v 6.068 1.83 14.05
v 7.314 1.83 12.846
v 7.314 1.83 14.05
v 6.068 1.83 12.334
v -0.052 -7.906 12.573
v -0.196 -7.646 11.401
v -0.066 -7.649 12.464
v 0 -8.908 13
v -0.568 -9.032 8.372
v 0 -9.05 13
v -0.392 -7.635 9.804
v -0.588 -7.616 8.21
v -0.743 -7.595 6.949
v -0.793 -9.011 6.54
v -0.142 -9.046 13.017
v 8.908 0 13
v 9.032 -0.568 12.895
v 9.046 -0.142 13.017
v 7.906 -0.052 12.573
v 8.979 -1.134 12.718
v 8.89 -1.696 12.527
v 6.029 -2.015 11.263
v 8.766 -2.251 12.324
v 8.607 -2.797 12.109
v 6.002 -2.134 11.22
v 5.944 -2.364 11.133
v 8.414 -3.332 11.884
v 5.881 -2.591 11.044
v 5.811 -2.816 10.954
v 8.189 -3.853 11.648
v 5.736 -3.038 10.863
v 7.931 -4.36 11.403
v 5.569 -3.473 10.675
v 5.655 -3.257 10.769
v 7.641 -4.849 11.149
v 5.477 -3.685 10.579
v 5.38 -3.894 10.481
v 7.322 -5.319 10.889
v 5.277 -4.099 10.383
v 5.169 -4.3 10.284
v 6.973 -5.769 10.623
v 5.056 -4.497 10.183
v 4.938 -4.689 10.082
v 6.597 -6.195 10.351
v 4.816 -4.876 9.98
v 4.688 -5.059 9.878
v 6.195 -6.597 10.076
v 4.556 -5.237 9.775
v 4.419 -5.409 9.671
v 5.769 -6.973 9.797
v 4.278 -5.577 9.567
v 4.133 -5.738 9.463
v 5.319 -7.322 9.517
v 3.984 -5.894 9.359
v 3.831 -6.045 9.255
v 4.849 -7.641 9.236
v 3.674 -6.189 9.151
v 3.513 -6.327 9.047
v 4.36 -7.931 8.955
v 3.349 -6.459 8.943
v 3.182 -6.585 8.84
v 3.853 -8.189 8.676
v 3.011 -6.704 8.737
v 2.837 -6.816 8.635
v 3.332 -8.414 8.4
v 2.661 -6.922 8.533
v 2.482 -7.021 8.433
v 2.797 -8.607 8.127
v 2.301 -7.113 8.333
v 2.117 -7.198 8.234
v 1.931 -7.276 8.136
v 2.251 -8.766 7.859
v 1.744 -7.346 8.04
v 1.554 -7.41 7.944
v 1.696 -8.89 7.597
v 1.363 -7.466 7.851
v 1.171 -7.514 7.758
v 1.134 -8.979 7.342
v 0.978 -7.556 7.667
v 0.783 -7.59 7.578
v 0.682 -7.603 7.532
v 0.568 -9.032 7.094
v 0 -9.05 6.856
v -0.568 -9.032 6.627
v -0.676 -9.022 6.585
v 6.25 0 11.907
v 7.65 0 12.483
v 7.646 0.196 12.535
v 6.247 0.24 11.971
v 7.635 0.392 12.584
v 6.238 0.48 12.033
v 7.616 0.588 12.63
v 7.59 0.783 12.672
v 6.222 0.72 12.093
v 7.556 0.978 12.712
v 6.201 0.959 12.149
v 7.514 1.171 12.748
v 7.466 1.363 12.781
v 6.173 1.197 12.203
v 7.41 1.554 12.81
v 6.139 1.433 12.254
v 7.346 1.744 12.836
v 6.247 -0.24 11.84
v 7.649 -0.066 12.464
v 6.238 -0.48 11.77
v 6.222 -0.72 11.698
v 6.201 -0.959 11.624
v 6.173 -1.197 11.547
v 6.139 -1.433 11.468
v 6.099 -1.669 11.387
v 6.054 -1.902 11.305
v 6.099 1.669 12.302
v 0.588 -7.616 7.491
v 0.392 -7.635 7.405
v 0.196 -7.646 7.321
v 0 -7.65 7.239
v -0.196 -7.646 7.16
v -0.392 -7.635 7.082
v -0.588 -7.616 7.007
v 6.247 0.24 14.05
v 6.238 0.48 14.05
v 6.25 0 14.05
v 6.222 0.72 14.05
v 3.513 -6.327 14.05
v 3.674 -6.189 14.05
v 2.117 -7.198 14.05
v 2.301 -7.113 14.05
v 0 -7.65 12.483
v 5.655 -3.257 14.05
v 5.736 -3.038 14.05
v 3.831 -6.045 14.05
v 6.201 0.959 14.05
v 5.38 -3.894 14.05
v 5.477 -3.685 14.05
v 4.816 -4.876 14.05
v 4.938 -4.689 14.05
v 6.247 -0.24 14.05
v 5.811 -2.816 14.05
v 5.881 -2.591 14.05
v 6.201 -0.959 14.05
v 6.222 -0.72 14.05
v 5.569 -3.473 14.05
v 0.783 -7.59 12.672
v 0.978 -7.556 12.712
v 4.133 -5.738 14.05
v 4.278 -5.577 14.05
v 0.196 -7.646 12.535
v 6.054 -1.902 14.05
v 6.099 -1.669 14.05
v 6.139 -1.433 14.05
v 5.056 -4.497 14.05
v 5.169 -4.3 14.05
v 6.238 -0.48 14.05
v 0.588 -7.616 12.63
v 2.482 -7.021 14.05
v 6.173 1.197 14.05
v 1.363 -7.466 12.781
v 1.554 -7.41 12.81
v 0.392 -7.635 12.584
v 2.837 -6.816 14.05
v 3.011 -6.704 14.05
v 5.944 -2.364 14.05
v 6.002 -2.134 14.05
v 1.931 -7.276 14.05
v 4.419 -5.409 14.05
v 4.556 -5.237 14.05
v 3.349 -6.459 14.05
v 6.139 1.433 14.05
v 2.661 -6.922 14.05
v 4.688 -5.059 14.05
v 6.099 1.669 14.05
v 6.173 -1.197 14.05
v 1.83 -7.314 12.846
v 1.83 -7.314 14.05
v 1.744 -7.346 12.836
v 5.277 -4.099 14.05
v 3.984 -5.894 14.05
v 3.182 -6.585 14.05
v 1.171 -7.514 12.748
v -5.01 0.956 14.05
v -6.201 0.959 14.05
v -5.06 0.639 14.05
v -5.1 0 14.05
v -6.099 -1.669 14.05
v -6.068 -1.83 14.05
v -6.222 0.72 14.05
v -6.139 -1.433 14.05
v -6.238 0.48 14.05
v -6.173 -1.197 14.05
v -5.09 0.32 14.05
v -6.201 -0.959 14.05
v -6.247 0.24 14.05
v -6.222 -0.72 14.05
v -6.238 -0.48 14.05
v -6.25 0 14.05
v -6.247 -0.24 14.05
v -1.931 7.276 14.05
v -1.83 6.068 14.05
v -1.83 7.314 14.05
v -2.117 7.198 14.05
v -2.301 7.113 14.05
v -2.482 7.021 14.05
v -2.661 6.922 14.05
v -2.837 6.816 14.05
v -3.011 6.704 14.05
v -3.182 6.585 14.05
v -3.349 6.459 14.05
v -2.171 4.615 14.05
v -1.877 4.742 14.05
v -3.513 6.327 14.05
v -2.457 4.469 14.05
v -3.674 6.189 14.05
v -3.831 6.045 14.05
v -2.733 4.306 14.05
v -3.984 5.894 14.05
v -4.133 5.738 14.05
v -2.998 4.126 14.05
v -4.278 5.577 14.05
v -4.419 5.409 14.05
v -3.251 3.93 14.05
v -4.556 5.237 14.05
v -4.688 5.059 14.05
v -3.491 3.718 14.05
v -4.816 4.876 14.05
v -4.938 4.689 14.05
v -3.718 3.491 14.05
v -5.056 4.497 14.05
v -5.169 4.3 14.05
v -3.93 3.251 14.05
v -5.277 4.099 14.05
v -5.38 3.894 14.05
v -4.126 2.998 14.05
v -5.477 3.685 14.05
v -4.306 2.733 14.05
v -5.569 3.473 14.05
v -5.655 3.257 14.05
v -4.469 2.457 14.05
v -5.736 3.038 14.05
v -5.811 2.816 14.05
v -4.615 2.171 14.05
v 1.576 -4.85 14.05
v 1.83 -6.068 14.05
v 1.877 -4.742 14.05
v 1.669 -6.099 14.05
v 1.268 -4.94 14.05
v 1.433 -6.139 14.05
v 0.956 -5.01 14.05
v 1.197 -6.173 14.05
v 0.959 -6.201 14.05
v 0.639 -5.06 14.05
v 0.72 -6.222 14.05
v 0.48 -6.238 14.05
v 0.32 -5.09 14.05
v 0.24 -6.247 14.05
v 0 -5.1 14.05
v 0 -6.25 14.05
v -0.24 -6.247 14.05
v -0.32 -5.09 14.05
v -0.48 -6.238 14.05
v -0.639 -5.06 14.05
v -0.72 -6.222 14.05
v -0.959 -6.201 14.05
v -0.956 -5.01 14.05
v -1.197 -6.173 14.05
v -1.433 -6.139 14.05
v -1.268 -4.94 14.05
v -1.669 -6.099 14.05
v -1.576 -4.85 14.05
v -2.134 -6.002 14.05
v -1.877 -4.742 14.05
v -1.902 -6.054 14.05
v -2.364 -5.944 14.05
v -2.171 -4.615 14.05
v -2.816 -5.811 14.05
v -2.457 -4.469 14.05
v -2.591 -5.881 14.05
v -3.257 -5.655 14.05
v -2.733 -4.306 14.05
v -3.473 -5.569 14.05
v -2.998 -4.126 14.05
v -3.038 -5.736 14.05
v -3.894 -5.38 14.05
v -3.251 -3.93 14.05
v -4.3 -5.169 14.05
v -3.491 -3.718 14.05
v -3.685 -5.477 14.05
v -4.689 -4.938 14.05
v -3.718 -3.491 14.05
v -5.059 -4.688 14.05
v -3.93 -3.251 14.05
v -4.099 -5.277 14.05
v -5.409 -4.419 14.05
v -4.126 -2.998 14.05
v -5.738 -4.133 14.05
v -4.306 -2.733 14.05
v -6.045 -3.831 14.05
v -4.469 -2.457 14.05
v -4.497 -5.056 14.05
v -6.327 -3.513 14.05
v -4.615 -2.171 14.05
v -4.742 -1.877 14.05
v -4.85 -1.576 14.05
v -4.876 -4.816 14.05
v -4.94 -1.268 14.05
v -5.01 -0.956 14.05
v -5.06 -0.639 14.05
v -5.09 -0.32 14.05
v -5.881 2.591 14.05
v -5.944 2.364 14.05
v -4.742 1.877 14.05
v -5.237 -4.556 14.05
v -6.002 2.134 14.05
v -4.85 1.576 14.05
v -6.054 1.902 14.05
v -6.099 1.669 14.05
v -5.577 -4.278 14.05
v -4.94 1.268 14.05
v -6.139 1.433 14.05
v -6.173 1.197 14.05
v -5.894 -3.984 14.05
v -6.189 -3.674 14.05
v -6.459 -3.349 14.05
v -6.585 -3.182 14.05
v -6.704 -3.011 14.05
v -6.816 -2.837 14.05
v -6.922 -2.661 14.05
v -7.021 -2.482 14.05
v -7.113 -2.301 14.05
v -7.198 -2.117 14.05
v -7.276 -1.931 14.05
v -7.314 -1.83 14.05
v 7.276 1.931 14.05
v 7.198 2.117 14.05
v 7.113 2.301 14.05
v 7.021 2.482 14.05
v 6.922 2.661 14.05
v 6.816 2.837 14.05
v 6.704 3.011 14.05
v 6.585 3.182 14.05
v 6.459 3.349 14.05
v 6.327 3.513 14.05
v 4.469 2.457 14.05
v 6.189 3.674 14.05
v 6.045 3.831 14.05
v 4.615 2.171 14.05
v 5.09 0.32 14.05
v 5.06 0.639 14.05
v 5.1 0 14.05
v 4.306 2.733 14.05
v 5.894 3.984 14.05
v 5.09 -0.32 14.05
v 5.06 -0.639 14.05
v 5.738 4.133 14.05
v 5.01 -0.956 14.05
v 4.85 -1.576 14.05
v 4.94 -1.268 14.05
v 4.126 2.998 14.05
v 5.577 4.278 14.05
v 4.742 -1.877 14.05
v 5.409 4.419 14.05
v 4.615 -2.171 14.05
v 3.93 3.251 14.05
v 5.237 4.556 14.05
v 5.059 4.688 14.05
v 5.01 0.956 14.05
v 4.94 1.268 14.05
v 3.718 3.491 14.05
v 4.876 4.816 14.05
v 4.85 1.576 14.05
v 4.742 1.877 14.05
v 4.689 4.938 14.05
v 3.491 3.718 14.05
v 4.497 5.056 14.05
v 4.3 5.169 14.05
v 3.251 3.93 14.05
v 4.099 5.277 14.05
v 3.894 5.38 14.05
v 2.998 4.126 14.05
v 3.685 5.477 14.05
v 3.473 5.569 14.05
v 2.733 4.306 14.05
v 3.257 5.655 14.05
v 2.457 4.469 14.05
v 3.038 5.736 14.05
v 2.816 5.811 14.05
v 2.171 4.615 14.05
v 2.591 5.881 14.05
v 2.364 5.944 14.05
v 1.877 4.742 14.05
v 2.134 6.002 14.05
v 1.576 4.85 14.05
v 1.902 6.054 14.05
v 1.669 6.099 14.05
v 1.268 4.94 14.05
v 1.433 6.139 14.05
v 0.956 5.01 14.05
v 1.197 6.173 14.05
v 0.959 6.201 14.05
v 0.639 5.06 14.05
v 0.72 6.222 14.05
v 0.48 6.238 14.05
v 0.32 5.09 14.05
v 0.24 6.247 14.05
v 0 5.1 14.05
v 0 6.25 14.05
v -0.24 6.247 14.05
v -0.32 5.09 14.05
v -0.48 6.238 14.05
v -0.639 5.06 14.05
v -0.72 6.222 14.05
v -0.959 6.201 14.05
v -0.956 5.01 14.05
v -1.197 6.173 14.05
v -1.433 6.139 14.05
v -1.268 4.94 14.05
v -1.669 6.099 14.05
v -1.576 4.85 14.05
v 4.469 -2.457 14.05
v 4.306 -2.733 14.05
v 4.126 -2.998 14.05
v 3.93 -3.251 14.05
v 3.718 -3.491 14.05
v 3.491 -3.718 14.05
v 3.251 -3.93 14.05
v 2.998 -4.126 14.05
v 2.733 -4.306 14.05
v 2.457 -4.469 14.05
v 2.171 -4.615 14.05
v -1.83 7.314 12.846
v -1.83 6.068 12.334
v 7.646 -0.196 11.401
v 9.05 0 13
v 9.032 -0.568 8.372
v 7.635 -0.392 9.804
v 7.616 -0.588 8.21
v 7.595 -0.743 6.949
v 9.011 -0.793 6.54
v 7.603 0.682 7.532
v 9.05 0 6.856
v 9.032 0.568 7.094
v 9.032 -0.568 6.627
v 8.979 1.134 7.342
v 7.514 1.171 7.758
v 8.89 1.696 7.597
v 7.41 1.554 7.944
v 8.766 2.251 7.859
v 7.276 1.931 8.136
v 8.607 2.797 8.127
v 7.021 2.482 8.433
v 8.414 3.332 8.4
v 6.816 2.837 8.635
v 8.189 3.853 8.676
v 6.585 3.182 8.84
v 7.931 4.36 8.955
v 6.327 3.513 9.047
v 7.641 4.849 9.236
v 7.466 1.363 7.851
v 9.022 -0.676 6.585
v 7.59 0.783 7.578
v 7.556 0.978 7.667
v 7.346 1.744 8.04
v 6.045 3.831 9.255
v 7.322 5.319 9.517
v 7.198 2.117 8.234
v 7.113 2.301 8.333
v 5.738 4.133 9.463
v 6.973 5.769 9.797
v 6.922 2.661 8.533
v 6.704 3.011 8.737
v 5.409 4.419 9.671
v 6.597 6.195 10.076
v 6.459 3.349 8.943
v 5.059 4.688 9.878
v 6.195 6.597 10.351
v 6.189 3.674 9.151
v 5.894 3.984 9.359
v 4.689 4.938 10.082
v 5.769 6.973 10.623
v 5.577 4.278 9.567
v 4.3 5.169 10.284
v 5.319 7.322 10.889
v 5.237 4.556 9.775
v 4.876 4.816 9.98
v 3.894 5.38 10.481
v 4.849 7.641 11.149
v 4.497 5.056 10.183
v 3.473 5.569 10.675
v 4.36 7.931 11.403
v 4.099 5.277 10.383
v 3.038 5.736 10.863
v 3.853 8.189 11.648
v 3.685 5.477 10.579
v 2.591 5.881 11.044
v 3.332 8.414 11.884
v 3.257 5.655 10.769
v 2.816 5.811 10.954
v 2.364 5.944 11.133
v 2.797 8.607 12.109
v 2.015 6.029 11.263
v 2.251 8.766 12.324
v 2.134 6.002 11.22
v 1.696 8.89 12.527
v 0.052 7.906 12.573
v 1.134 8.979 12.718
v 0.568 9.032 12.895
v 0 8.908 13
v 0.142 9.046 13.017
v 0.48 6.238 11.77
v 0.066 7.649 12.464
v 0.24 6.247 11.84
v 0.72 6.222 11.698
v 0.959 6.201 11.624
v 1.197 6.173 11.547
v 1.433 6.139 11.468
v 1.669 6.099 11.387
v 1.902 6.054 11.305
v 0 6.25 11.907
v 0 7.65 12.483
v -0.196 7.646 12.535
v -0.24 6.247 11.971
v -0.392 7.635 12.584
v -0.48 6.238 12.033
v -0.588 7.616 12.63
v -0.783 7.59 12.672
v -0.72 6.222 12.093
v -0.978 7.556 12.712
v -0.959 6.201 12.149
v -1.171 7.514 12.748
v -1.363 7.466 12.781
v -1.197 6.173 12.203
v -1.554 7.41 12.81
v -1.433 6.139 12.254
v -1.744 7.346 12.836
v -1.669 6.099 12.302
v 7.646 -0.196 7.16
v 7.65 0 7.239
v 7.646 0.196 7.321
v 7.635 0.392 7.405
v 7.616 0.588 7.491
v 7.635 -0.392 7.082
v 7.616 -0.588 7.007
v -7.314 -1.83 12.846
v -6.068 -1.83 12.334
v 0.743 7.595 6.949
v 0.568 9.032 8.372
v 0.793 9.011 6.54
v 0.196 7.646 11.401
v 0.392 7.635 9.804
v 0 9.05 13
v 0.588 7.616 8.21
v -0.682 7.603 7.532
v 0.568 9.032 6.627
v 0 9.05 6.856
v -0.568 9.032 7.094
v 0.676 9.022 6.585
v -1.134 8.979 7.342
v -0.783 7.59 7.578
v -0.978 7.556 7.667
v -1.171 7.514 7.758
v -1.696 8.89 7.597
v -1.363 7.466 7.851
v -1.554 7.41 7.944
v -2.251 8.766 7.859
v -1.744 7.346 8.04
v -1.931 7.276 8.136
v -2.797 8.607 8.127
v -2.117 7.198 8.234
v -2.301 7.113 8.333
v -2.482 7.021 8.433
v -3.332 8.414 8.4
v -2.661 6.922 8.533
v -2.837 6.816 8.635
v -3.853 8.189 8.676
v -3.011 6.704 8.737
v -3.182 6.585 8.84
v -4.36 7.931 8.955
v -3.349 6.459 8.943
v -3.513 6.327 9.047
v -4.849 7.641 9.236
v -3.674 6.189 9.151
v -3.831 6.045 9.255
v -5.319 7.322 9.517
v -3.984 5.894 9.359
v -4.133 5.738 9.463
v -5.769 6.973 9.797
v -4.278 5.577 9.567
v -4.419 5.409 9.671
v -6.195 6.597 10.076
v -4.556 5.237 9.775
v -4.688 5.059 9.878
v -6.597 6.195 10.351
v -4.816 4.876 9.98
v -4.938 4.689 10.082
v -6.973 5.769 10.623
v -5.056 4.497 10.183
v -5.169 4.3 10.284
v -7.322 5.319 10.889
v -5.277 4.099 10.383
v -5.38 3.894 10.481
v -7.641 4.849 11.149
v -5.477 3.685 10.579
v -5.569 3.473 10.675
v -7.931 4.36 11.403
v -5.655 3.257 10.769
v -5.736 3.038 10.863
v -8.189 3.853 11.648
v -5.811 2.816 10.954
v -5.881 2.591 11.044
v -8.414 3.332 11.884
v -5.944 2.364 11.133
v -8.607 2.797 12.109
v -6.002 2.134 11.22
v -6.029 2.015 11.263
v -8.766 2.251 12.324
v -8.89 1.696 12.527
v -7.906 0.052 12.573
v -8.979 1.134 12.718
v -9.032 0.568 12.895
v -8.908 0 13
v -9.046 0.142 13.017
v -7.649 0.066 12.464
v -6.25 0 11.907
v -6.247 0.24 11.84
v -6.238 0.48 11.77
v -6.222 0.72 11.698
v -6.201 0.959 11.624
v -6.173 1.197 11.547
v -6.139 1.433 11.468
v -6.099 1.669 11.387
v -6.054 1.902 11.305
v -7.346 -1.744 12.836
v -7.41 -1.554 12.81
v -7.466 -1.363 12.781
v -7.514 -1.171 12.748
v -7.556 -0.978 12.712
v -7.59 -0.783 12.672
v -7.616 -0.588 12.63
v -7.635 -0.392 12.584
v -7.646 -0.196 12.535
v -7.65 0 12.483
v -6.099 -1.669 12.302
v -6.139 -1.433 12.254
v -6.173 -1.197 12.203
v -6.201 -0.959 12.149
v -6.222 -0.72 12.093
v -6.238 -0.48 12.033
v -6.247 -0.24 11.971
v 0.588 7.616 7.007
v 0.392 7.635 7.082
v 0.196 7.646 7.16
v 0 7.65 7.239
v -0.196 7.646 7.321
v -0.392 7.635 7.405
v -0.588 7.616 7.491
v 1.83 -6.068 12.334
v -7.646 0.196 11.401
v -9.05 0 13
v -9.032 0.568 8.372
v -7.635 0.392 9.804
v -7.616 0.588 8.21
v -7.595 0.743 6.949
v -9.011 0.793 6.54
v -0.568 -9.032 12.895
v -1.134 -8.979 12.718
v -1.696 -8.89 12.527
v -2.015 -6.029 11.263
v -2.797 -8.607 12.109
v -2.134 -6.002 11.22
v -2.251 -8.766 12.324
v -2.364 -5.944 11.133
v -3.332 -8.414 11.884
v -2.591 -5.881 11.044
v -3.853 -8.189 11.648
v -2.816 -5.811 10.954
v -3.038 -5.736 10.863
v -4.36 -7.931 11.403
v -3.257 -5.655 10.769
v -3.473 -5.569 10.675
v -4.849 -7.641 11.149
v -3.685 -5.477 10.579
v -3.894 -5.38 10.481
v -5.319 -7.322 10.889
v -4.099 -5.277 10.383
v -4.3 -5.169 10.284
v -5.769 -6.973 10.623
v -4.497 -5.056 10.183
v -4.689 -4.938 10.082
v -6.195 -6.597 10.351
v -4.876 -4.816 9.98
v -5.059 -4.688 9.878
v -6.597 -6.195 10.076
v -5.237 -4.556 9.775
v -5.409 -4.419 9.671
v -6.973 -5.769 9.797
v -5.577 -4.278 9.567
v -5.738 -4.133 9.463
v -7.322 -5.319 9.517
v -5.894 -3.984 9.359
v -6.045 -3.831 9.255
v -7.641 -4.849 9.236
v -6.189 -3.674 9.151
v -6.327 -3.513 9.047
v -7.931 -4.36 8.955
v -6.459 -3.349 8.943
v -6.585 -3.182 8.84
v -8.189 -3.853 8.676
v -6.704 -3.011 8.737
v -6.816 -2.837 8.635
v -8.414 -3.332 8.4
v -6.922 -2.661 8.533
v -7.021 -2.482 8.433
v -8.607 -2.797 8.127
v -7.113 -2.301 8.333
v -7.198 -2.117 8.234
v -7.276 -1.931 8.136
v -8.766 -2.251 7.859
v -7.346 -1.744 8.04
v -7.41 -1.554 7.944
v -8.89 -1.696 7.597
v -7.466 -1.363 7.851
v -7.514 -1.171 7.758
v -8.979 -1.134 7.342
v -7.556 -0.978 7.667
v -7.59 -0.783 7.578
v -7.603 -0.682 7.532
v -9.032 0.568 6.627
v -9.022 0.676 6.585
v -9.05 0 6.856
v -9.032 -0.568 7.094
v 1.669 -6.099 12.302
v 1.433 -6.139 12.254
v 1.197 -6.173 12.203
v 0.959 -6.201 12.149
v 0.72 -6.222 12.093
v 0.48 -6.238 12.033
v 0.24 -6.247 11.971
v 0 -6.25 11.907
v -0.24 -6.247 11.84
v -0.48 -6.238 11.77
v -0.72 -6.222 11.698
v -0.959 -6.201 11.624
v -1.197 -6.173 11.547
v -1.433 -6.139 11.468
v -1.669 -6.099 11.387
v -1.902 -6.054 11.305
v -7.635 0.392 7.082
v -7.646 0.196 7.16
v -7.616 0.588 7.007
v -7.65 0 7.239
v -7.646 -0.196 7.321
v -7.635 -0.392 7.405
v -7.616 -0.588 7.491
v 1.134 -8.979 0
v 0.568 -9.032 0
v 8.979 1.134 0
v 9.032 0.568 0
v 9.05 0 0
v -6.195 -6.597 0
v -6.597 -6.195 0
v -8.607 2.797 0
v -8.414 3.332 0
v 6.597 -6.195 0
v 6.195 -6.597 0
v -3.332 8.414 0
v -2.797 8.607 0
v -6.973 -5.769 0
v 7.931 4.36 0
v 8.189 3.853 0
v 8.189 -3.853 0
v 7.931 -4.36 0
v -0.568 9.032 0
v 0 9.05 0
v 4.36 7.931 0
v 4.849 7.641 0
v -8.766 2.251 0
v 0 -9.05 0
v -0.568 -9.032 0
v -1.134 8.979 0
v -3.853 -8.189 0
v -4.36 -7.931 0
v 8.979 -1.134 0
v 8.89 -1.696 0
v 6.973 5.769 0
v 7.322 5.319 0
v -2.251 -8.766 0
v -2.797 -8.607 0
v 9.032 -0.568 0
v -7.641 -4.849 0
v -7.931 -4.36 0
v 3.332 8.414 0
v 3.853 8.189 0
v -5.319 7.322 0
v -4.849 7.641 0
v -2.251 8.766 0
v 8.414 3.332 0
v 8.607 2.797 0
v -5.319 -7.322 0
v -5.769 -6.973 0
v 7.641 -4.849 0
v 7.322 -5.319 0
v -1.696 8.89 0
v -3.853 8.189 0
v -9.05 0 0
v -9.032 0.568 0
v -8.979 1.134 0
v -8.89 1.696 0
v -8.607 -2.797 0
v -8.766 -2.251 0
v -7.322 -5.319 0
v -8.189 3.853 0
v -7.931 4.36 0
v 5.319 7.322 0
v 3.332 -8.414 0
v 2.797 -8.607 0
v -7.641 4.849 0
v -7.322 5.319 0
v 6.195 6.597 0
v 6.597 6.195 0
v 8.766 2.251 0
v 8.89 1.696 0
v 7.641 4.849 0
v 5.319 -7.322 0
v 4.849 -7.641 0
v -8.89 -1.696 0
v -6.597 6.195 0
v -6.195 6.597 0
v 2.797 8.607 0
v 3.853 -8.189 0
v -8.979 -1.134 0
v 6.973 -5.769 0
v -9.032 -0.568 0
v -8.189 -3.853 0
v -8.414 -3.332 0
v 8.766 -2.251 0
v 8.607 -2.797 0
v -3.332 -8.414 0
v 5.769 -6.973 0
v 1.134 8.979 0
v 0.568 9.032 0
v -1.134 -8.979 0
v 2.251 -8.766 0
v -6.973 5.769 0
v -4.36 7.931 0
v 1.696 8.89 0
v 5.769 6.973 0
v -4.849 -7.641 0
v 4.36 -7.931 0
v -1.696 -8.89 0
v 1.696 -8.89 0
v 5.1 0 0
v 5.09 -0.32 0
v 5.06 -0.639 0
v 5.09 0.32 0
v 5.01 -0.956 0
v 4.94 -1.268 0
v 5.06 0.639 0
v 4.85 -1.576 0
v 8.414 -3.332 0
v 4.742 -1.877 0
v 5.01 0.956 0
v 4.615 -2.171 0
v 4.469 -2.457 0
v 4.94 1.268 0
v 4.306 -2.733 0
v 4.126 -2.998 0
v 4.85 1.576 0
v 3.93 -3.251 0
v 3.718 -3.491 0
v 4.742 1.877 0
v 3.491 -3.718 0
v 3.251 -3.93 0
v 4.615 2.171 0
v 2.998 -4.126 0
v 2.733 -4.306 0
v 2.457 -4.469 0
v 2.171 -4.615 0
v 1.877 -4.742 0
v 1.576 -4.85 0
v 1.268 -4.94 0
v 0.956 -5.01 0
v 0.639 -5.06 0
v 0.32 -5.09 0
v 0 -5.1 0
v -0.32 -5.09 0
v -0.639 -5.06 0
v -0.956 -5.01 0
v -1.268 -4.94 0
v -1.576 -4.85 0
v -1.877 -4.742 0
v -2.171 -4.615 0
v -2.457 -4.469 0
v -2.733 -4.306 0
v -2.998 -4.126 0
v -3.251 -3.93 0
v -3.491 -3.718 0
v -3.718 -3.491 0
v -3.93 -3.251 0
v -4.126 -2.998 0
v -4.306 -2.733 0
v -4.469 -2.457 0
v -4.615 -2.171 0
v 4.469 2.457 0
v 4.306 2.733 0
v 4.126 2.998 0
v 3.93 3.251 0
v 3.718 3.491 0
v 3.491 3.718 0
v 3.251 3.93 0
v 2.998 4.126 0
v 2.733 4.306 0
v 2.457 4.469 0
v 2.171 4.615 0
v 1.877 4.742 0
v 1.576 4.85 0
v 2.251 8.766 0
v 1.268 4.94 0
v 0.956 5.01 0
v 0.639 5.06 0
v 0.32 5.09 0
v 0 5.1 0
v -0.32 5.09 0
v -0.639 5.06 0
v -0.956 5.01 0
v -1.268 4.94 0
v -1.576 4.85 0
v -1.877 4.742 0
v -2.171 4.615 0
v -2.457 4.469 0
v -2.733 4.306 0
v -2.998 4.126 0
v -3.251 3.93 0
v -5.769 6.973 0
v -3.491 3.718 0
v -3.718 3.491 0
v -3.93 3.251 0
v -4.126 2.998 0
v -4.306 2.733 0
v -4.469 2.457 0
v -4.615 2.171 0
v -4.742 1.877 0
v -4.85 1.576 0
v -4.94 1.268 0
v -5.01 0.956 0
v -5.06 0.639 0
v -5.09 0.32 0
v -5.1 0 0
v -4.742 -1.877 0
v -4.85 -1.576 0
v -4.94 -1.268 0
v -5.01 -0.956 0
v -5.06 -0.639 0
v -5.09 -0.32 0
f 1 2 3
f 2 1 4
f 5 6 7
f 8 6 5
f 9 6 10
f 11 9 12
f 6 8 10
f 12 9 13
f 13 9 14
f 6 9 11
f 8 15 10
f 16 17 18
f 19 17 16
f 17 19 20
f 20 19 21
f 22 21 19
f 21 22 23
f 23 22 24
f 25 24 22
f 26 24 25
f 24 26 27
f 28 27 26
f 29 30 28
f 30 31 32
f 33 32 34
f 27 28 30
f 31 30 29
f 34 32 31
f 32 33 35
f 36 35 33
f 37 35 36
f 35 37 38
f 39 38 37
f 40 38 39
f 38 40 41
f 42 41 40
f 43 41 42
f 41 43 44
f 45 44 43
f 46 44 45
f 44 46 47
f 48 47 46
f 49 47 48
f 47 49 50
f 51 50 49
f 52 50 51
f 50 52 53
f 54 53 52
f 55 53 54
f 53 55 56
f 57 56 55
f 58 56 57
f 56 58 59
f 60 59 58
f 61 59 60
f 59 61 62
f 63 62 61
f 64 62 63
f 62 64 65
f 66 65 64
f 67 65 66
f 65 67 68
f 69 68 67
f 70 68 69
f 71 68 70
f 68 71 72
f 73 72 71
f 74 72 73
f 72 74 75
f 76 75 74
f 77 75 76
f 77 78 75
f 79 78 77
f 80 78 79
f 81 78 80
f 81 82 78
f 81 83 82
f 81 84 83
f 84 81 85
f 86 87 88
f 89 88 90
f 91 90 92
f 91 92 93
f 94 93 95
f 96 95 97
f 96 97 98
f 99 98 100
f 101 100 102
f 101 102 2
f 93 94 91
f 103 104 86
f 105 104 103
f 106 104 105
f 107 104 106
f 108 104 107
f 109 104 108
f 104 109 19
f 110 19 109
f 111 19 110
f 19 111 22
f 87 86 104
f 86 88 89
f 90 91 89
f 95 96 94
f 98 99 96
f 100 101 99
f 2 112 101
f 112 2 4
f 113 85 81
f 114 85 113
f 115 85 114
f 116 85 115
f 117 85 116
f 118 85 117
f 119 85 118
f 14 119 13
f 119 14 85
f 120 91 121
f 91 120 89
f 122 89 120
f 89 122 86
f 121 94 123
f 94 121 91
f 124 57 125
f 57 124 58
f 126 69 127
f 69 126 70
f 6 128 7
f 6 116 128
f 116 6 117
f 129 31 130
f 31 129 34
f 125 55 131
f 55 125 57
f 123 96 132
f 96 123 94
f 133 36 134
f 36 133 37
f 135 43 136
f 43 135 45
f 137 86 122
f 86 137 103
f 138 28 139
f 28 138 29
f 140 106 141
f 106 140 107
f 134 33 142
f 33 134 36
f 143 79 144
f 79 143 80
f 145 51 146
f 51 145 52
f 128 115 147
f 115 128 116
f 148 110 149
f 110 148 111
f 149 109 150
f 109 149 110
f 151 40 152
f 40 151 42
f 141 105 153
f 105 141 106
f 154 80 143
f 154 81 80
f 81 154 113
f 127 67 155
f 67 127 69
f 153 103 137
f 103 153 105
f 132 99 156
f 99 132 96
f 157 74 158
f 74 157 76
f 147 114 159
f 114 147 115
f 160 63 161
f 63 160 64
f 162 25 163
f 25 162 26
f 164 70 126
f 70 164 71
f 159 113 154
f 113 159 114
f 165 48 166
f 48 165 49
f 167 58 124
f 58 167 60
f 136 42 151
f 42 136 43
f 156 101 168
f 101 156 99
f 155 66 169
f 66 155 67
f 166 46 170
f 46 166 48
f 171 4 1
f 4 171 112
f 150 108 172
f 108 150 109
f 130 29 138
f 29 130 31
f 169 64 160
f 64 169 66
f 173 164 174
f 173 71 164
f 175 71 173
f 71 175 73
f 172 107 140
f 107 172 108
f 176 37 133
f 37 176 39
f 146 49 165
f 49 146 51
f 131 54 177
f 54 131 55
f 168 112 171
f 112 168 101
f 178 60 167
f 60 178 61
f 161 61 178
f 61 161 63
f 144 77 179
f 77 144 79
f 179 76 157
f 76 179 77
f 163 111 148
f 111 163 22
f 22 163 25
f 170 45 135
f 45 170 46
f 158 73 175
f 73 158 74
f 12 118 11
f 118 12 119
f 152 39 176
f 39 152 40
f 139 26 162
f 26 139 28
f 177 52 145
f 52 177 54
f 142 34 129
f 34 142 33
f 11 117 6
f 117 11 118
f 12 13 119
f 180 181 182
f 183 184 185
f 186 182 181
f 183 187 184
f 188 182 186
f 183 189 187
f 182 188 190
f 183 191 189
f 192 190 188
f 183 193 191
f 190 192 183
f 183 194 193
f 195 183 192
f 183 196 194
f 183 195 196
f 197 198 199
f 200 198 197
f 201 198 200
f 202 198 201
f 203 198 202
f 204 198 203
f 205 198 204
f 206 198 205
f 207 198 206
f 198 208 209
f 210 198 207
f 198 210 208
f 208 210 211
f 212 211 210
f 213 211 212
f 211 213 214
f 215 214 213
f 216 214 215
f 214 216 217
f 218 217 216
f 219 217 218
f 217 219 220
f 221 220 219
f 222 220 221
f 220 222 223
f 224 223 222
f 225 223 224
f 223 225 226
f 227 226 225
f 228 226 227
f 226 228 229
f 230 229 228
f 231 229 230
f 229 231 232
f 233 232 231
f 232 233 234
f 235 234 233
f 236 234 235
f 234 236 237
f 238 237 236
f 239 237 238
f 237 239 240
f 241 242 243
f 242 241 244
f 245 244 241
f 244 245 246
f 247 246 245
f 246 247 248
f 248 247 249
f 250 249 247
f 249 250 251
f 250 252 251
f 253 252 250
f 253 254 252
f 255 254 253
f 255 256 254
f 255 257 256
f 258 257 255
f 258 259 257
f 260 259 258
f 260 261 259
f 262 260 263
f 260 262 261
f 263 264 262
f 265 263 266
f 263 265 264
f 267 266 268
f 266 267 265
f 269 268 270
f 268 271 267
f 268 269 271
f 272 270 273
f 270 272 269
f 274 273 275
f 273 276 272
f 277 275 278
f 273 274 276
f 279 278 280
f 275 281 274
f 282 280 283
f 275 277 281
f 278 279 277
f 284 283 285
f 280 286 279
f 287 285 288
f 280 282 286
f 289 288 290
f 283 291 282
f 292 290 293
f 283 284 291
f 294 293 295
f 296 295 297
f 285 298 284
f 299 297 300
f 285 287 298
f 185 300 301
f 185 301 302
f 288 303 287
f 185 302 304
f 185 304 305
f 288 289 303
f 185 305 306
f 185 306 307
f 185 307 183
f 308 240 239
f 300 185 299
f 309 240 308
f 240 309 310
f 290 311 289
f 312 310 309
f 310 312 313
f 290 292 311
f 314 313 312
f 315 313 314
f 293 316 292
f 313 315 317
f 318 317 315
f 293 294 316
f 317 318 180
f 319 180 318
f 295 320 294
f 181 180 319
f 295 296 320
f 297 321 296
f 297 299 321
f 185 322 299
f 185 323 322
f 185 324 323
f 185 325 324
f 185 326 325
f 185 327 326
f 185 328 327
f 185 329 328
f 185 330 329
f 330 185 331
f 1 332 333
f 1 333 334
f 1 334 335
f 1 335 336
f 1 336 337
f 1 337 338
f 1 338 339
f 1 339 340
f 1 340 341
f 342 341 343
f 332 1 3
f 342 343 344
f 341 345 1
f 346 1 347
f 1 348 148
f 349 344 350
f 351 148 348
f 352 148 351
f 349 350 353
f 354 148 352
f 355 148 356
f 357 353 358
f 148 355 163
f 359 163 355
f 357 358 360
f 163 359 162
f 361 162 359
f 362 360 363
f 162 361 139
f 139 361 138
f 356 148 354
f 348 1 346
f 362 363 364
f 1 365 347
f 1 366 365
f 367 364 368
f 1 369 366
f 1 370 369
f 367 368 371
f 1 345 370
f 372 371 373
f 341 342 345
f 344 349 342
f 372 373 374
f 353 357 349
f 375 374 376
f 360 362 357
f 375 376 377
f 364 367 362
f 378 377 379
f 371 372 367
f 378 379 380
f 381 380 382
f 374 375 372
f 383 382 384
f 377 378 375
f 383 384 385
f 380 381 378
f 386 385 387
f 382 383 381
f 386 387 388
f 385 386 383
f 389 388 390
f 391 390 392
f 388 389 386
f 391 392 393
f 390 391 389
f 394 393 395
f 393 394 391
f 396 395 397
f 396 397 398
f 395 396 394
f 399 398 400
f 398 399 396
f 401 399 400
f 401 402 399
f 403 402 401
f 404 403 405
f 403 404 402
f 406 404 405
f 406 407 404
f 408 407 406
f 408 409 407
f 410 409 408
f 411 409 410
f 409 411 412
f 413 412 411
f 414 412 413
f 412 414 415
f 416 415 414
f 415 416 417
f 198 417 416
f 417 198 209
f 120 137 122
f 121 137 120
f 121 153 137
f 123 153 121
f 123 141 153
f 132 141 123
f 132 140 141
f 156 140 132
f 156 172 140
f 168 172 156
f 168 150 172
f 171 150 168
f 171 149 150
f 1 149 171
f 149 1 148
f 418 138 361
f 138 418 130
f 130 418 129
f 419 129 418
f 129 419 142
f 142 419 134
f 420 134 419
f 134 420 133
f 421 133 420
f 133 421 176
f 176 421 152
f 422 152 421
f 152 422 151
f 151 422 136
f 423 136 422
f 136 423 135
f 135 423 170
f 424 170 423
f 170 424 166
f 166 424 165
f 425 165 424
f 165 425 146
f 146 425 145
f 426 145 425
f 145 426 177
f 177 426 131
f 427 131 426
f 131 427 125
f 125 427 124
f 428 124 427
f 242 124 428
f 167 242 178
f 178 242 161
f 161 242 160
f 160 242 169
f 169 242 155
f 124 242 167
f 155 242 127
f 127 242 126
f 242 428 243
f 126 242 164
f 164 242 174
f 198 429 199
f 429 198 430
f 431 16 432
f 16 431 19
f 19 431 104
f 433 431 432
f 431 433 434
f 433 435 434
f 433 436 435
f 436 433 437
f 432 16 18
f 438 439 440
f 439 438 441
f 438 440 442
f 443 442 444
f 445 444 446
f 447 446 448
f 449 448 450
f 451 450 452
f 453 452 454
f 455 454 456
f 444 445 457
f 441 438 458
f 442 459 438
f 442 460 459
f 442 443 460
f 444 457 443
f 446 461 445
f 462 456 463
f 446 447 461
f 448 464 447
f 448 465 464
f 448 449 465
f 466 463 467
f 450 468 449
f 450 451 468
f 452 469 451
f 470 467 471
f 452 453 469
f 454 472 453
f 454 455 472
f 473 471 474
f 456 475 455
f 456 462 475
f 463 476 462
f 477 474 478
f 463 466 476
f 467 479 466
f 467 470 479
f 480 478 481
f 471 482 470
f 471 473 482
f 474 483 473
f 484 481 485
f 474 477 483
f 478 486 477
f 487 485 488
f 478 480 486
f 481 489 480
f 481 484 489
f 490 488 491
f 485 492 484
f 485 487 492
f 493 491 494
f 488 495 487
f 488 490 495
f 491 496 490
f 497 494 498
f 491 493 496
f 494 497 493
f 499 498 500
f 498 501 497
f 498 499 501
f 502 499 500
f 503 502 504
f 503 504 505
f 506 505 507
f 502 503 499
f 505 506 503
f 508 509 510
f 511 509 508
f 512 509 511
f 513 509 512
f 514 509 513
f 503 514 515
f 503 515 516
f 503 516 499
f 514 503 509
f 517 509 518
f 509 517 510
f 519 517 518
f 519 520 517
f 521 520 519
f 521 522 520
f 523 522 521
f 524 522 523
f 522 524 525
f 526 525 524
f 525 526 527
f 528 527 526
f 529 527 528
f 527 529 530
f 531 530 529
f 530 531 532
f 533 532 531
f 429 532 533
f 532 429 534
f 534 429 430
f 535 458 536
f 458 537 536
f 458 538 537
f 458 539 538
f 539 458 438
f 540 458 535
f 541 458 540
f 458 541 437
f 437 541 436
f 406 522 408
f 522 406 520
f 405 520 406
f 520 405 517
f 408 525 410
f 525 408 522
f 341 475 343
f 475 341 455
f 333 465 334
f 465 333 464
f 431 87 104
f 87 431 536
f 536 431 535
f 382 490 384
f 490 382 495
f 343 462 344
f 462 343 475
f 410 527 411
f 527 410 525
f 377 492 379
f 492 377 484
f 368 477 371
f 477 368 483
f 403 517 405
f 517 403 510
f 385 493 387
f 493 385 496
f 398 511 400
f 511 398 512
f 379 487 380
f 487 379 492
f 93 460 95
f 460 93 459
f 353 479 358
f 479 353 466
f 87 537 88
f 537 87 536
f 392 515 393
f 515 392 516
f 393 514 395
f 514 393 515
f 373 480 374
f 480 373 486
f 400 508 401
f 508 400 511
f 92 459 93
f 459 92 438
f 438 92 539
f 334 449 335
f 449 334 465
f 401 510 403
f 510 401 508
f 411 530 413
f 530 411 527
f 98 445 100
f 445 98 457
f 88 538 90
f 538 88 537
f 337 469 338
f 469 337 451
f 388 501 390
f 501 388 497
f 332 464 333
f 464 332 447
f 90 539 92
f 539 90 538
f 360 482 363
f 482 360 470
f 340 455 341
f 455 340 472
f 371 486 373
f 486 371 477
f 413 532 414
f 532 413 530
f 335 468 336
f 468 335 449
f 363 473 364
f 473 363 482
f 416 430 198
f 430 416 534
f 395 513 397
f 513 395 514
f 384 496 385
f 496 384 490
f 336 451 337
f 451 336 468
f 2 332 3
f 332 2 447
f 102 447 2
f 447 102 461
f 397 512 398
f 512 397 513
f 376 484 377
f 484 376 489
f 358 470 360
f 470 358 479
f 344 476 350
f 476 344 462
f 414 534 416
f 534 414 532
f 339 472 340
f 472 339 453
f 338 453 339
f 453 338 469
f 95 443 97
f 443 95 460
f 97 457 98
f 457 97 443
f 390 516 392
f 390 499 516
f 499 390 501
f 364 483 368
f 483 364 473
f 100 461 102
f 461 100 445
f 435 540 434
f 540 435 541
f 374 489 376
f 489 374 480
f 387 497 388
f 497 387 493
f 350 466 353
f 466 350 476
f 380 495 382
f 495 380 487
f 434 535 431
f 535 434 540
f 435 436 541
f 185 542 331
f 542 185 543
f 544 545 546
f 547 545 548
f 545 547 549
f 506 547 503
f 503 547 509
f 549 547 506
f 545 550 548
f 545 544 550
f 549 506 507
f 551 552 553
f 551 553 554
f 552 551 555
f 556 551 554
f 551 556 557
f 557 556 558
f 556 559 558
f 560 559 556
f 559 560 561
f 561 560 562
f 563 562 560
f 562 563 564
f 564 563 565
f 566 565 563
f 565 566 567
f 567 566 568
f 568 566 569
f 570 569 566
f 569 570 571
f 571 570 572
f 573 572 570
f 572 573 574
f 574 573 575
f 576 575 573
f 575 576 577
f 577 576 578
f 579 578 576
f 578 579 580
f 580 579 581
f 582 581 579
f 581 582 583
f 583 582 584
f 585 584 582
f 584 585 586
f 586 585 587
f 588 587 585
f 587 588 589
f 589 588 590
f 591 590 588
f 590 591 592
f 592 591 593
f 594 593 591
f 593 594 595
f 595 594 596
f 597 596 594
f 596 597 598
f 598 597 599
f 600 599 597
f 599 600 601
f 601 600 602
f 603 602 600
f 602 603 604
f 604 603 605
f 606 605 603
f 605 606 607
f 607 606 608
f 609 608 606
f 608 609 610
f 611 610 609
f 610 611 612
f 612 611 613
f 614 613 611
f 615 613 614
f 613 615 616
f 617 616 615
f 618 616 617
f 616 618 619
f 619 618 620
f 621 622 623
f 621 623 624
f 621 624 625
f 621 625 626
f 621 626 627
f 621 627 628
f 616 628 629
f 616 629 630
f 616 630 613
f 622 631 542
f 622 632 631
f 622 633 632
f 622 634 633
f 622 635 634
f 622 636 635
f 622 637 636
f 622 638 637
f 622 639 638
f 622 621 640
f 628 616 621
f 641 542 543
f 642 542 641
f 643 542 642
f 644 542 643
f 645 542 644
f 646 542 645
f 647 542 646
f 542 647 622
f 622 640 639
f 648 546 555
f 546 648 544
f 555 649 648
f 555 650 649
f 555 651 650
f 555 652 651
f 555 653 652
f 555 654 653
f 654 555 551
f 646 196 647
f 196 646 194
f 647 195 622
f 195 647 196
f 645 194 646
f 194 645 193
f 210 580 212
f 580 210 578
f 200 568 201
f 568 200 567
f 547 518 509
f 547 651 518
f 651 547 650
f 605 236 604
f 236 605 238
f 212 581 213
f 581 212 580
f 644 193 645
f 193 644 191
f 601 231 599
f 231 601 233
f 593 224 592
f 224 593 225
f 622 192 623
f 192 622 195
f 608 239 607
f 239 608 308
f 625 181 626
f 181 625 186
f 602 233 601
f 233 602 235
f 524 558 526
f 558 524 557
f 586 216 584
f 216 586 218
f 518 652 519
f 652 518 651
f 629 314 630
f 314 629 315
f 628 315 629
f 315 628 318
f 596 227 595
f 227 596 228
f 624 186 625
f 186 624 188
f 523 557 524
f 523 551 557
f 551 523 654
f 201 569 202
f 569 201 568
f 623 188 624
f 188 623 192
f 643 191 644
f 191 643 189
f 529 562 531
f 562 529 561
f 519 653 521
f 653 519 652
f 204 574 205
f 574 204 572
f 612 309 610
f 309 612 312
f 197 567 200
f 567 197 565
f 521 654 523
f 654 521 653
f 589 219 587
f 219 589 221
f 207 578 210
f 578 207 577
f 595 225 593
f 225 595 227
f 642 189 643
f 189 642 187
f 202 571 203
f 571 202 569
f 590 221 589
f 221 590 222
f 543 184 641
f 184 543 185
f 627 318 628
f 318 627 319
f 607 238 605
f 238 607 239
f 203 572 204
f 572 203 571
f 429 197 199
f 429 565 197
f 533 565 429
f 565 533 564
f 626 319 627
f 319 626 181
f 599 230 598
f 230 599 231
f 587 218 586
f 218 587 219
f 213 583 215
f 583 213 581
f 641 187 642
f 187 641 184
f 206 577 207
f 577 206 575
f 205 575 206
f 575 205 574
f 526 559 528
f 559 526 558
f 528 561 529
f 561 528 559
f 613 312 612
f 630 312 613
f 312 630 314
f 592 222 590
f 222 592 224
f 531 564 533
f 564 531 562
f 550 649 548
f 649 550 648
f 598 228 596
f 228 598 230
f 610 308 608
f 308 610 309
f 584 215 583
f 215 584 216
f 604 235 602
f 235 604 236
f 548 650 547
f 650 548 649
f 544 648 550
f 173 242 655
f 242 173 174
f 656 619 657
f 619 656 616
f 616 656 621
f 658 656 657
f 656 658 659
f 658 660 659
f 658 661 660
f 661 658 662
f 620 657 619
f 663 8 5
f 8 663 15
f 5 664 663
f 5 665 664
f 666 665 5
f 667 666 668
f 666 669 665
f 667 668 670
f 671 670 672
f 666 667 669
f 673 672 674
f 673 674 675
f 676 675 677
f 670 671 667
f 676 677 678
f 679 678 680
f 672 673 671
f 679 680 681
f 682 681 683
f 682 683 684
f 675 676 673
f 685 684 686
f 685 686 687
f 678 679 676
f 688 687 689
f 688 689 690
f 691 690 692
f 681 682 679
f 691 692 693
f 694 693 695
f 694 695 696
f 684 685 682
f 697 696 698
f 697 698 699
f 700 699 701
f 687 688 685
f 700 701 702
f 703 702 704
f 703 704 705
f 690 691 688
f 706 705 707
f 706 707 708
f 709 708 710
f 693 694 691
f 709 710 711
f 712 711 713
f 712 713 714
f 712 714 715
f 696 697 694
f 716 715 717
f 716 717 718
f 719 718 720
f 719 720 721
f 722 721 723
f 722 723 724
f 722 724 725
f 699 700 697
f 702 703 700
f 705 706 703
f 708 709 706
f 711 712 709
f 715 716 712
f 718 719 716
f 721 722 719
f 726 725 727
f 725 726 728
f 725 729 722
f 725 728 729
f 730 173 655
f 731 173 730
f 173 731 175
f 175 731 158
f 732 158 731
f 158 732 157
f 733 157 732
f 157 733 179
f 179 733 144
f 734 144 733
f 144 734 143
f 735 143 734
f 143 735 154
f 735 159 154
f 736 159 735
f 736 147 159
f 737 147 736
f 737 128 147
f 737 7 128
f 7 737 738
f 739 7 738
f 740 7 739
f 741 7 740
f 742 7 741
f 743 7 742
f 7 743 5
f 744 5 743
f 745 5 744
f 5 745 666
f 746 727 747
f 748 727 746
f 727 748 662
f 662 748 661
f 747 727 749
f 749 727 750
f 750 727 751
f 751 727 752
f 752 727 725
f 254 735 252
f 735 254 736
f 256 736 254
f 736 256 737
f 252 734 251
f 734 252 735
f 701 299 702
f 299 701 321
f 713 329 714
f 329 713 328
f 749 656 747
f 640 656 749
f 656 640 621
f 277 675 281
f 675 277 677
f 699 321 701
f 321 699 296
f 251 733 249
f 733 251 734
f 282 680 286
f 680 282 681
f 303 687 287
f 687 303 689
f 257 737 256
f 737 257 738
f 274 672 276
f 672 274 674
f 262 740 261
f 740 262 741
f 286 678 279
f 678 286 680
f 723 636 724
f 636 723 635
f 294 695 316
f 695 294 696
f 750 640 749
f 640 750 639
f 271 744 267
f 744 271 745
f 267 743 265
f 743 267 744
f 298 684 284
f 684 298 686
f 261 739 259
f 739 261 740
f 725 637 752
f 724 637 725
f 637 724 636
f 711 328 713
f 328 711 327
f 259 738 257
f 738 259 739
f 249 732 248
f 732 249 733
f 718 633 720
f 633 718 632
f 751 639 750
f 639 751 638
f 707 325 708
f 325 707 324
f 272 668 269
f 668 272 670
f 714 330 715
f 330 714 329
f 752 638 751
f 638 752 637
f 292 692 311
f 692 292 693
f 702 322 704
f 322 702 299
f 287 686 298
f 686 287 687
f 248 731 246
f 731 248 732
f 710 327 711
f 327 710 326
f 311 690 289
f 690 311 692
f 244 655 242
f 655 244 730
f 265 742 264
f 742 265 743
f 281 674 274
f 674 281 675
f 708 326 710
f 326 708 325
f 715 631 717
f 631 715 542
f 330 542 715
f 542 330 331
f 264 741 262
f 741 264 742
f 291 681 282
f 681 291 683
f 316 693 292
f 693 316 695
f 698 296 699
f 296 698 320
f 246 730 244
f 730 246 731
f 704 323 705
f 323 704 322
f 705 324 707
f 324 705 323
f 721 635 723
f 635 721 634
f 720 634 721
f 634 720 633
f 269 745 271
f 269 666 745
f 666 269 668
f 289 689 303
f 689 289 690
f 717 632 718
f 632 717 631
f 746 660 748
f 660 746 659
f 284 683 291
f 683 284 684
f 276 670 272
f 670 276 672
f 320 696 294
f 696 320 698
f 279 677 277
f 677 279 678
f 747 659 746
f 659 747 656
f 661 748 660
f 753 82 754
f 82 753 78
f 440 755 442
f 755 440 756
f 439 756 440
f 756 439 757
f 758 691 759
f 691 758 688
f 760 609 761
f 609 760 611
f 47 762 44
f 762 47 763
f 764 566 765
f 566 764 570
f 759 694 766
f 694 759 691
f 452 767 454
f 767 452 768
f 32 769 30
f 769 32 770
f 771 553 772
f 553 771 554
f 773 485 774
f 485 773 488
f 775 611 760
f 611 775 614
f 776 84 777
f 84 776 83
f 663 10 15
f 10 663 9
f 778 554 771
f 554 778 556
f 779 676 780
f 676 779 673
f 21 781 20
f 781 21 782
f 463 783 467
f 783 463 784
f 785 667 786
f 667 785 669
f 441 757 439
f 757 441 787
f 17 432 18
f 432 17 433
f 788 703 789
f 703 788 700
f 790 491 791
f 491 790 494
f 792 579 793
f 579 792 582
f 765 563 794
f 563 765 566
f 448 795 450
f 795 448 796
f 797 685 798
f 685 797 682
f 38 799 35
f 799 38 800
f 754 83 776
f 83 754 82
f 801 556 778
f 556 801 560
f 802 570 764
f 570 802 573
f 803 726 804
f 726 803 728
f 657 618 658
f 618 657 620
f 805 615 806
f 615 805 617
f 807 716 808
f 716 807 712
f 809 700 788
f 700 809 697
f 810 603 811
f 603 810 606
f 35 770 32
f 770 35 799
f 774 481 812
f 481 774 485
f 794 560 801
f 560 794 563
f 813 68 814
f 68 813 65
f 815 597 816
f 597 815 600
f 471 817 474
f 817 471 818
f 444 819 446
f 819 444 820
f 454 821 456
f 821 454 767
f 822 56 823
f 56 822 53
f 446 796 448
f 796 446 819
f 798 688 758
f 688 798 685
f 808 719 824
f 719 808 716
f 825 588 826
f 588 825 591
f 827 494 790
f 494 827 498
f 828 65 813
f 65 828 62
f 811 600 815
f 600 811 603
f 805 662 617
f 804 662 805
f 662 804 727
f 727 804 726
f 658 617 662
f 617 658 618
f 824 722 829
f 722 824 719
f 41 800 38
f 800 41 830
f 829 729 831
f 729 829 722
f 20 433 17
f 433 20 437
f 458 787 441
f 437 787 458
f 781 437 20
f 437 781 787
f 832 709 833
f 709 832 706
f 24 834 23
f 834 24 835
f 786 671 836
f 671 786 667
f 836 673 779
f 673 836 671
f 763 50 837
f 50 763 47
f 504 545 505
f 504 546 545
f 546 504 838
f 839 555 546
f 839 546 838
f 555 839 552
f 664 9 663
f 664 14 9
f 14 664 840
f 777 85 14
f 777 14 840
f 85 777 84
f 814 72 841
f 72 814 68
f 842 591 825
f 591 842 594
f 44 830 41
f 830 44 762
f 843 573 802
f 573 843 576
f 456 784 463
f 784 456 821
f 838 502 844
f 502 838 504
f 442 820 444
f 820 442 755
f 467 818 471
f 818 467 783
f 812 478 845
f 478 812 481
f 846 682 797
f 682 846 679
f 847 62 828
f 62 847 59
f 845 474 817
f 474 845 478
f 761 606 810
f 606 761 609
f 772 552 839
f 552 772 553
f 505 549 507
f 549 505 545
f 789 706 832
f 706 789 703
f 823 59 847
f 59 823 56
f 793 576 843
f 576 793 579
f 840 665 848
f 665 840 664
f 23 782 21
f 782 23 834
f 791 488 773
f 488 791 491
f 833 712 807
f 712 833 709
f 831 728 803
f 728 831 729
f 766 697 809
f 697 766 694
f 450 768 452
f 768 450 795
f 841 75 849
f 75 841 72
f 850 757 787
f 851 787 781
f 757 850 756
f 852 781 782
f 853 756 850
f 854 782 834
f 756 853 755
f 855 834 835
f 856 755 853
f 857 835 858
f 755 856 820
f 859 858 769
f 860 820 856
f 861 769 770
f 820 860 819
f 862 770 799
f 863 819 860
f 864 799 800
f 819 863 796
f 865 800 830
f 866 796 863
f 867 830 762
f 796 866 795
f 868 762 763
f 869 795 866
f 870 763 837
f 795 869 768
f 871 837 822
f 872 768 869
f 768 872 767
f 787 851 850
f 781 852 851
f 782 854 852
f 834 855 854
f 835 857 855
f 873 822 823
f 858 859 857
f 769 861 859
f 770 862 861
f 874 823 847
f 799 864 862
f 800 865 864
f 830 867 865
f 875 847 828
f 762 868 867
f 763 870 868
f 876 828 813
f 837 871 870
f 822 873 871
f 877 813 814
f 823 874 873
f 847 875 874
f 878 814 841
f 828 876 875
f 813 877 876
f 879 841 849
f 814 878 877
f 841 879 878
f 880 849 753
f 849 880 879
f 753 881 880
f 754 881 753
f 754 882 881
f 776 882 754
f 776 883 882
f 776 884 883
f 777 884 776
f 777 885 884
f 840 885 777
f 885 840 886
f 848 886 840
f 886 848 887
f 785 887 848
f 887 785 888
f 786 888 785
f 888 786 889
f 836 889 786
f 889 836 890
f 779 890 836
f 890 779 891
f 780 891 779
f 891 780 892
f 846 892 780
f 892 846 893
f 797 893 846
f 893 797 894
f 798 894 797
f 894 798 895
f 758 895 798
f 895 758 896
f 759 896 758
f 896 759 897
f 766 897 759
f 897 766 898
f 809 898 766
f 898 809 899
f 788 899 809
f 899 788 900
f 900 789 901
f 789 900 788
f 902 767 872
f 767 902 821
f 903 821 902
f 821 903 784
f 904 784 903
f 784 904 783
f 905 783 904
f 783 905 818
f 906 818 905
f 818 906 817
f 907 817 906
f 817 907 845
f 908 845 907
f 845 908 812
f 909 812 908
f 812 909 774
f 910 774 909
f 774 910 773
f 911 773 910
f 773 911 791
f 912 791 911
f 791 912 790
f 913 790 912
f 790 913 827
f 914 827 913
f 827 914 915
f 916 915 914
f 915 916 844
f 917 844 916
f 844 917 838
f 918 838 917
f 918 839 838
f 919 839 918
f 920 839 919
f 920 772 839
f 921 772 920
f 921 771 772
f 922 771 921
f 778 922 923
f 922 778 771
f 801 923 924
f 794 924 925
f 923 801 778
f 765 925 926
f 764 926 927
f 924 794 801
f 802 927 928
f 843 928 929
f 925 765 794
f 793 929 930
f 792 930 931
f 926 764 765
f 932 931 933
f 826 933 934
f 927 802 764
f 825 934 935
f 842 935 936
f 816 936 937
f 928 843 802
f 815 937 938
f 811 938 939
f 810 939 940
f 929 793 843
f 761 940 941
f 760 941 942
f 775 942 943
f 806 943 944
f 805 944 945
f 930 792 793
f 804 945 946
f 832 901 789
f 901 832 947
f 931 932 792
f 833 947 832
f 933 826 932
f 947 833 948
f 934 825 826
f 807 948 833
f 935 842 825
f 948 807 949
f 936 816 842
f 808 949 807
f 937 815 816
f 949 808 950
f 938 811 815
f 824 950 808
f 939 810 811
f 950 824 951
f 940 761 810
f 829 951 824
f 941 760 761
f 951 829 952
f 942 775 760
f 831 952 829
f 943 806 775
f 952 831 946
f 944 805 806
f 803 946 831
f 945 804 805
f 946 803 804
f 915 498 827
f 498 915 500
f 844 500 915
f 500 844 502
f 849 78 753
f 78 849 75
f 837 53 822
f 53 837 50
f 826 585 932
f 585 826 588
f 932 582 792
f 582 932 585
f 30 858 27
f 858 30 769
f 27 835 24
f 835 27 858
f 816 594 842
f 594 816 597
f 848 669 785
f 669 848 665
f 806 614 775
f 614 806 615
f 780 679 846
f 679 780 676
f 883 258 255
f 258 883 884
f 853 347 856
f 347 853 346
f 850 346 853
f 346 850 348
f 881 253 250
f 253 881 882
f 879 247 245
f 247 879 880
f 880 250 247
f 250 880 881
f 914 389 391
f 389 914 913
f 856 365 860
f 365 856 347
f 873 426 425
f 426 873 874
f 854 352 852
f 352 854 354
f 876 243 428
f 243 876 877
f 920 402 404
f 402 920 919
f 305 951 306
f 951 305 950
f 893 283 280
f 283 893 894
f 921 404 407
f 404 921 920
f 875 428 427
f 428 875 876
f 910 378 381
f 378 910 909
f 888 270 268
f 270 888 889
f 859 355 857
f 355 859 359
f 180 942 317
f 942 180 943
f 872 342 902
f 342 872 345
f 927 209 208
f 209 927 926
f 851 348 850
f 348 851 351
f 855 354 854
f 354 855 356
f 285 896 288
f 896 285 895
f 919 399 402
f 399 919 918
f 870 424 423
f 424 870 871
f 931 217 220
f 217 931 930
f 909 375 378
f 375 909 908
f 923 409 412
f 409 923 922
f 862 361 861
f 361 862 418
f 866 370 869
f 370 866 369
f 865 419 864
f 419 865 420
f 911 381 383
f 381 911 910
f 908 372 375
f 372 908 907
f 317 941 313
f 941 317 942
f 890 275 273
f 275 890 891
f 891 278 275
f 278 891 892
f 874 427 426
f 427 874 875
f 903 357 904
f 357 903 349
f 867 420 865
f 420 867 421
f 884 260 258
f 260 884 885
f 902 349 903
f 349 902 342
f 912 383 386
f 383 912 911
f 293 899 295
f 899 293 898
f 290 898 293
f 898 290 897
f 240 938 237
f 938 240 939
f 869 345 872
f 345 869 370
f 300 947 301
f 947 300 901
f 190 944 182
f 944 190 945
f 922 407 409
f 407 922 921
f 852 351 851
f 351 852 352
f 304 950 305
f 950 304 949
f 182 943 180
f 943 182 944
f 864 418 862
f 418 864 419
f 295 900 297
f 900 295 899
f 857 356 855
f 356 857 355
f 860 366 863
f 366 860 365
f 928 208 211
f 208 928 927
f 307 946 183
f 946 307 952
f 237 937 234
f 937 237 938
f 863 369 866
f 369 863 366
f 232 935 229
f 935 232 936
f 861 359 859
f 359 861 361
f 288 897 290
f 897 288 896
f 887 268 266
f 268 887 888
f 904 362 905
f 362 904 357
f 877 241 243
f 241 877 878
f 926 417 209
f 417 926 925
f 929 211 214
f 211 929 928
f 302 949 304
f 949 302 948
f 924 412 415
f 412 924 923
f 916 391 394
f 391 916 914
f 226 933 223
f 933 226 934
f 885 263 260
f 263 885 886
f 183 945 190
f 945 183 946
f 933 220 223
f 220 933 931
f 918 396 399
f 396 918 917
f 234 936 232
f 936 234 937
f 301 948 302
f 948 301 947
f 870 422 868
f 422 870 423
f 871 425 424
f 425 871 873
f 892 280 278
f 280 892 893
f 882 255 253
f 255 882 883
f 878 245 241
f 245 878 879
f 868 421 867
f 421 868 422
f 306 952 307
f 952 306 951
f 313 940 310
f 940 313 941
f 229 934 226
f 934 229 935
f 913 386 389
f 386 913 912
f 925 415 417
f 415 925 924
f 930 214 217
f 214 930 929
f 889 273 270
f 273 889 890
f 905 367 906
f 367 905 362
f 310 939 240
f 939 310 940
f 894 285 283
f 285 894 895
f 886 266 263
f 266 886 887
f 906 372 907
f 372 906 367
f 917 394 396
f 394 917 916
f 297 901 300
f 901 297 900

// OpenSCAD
// подшипник
// d=6 ?? 6
// D= 19.0
// h = 6;

delta = 0.1;


//antiTooth(7.65, 9.05 , 6.5);

R = 18.1 / 2;
r = (18.1 - 2.8 ) / 2;
h = 15;
th = 6.5;

$fn = 200;

simpleCrown(r, R, h, th, 1, true, true, false);

// внутренний / внешний радиусы, высота всей коронки, высота зуба, радиус сферы -- имитация резца, 'простота' -- имитировать резец, или обойтись
module simpleCrown(r, R, h, th, spR, simple, useHat, badIrbis = false)
{
	difference()
	{
		cylinder(r = R, h = h, $fn = 100);
		translate([0,0, -delta/2])
			cylinder(r = 2* r / 3, h = h + delta, $fn = 100);

		translate([0,0, h+ (useHat ? -2 : delta/8)])	
		union()
		{
			for (i = [0:3])
				rotate(90 *i, [0,0,1])
					if (simple)
						maTooth2(r, R, th, R-r, useHat, badIrbis);
					else
						minkowski()
						{
							antiTooth(r, R, th);
							sphere(r = spR, $fs=0.2, $fa=1);
						}
		}
	}
}




module maTooth(r, R, h, dx)
{
	difference()
	{
		antiTooth(r, R, h);
		ma(r, dx, h);
	}
}

module maTooth2(r, R, h, dx, useHat, irbis)
{
	hat = useHat ? 1 : 0;
//render()
	difference()
	{
		translate([0,0, -h])
			at2(R+delta, h, irbis);
		ma(r, dx, h+hat, hat);
	}
}

module ma(r, dx, h, hat= 0)
{
	translate([0,  0, hat - h - delta/2])
		scale([(r-dx) / r, 1, 1])
			cylinder(r = r, h = h + delta);
}

module at2(R, th, irbis)
{
	ga = 7; // угол атаки
	al = irbis ? atan(th / R) : 26.3; //25.8;	// угол задней поверхности
	vec = irbis ? [1, 0, 0] : [1, -1.5, 0];

	// вспомогательные величины
	tx = 4;
	tp = 1;
	td = 7;

//	intersection()
	{
//		cylinder(r=R, h= th);

		translate([0, -R, 0])
			difference()
			{
				translate([-0.2*R, 0, 0])
				cube([1.2*R, 1.2*R, th*1.5]);

				translate([0, 0, th])
					rotate(ga, [0, 1, 0])
						translate([-tx, -delta, -th/cos(ga)-tp])
							cube([tx, R+delta, th/cos(ga) +tp]);

				translate([-th * tan(ga), 0, 0])
			//	rotate(al2, [0,-1,0])
				//	translate([0,  0, 0])
						rotate(al, vec)
							translate([-0.3*R, -0.3*R,-td])
								 cube([2*R, 2*R, td]);
			}
	}

}

// зуб имеет высоту h, угол 90 гр, угол передней кромки (вид сверху) be, угол передней кромки (вид сбоку) ga
module antiTooth(r, R, h)
{
	be = 0; //22
	ga = 7;
/*
   [-R -h *tan(ga) , 0, -h]
	[-h*tan(ga), R*tan(be), R]
*/

	sibe = sin(be);
	cobe = cos(be);
	siga = sin(ga);
	coga = cos(ga);

//	rd = R - r + delta;

	compl = asin(R/r *sibe) - be ; // угол из центра на пересечение передней кромки и внутренней поверхности
	dr = R - r*cos(compl) + 8; // +4 -- запас, чтобы пересекались сектора соседних зубов.



   // S2 направляющих вектора
	// [- ctan(be), 1, 0]		
	// [  ctg(ga) , 0, 1]

//

 // 3*R и 2.1 -- подогнанные параметры :(

	polyhedron(points = [ [R, 0, 0], [3*R, -3*R, 0], [0, -R, 0], [-dr * tan(be) , -R + dr, 0],
								 [0 - h*tan(ga), -R, -h], [0 - h*tan(ga) - dr *tan(be), -R + dr, -h -dr*tan(be)*h/R+2.1]],

					faces = [ [0, 1, 2], [0, 2, 3], [1, 4, 2], [0,4,1], [0, 3, 5], [0, 5, 4], [2, 4, 3], [3, 4, 5] ],
					convexity = 4);
}
